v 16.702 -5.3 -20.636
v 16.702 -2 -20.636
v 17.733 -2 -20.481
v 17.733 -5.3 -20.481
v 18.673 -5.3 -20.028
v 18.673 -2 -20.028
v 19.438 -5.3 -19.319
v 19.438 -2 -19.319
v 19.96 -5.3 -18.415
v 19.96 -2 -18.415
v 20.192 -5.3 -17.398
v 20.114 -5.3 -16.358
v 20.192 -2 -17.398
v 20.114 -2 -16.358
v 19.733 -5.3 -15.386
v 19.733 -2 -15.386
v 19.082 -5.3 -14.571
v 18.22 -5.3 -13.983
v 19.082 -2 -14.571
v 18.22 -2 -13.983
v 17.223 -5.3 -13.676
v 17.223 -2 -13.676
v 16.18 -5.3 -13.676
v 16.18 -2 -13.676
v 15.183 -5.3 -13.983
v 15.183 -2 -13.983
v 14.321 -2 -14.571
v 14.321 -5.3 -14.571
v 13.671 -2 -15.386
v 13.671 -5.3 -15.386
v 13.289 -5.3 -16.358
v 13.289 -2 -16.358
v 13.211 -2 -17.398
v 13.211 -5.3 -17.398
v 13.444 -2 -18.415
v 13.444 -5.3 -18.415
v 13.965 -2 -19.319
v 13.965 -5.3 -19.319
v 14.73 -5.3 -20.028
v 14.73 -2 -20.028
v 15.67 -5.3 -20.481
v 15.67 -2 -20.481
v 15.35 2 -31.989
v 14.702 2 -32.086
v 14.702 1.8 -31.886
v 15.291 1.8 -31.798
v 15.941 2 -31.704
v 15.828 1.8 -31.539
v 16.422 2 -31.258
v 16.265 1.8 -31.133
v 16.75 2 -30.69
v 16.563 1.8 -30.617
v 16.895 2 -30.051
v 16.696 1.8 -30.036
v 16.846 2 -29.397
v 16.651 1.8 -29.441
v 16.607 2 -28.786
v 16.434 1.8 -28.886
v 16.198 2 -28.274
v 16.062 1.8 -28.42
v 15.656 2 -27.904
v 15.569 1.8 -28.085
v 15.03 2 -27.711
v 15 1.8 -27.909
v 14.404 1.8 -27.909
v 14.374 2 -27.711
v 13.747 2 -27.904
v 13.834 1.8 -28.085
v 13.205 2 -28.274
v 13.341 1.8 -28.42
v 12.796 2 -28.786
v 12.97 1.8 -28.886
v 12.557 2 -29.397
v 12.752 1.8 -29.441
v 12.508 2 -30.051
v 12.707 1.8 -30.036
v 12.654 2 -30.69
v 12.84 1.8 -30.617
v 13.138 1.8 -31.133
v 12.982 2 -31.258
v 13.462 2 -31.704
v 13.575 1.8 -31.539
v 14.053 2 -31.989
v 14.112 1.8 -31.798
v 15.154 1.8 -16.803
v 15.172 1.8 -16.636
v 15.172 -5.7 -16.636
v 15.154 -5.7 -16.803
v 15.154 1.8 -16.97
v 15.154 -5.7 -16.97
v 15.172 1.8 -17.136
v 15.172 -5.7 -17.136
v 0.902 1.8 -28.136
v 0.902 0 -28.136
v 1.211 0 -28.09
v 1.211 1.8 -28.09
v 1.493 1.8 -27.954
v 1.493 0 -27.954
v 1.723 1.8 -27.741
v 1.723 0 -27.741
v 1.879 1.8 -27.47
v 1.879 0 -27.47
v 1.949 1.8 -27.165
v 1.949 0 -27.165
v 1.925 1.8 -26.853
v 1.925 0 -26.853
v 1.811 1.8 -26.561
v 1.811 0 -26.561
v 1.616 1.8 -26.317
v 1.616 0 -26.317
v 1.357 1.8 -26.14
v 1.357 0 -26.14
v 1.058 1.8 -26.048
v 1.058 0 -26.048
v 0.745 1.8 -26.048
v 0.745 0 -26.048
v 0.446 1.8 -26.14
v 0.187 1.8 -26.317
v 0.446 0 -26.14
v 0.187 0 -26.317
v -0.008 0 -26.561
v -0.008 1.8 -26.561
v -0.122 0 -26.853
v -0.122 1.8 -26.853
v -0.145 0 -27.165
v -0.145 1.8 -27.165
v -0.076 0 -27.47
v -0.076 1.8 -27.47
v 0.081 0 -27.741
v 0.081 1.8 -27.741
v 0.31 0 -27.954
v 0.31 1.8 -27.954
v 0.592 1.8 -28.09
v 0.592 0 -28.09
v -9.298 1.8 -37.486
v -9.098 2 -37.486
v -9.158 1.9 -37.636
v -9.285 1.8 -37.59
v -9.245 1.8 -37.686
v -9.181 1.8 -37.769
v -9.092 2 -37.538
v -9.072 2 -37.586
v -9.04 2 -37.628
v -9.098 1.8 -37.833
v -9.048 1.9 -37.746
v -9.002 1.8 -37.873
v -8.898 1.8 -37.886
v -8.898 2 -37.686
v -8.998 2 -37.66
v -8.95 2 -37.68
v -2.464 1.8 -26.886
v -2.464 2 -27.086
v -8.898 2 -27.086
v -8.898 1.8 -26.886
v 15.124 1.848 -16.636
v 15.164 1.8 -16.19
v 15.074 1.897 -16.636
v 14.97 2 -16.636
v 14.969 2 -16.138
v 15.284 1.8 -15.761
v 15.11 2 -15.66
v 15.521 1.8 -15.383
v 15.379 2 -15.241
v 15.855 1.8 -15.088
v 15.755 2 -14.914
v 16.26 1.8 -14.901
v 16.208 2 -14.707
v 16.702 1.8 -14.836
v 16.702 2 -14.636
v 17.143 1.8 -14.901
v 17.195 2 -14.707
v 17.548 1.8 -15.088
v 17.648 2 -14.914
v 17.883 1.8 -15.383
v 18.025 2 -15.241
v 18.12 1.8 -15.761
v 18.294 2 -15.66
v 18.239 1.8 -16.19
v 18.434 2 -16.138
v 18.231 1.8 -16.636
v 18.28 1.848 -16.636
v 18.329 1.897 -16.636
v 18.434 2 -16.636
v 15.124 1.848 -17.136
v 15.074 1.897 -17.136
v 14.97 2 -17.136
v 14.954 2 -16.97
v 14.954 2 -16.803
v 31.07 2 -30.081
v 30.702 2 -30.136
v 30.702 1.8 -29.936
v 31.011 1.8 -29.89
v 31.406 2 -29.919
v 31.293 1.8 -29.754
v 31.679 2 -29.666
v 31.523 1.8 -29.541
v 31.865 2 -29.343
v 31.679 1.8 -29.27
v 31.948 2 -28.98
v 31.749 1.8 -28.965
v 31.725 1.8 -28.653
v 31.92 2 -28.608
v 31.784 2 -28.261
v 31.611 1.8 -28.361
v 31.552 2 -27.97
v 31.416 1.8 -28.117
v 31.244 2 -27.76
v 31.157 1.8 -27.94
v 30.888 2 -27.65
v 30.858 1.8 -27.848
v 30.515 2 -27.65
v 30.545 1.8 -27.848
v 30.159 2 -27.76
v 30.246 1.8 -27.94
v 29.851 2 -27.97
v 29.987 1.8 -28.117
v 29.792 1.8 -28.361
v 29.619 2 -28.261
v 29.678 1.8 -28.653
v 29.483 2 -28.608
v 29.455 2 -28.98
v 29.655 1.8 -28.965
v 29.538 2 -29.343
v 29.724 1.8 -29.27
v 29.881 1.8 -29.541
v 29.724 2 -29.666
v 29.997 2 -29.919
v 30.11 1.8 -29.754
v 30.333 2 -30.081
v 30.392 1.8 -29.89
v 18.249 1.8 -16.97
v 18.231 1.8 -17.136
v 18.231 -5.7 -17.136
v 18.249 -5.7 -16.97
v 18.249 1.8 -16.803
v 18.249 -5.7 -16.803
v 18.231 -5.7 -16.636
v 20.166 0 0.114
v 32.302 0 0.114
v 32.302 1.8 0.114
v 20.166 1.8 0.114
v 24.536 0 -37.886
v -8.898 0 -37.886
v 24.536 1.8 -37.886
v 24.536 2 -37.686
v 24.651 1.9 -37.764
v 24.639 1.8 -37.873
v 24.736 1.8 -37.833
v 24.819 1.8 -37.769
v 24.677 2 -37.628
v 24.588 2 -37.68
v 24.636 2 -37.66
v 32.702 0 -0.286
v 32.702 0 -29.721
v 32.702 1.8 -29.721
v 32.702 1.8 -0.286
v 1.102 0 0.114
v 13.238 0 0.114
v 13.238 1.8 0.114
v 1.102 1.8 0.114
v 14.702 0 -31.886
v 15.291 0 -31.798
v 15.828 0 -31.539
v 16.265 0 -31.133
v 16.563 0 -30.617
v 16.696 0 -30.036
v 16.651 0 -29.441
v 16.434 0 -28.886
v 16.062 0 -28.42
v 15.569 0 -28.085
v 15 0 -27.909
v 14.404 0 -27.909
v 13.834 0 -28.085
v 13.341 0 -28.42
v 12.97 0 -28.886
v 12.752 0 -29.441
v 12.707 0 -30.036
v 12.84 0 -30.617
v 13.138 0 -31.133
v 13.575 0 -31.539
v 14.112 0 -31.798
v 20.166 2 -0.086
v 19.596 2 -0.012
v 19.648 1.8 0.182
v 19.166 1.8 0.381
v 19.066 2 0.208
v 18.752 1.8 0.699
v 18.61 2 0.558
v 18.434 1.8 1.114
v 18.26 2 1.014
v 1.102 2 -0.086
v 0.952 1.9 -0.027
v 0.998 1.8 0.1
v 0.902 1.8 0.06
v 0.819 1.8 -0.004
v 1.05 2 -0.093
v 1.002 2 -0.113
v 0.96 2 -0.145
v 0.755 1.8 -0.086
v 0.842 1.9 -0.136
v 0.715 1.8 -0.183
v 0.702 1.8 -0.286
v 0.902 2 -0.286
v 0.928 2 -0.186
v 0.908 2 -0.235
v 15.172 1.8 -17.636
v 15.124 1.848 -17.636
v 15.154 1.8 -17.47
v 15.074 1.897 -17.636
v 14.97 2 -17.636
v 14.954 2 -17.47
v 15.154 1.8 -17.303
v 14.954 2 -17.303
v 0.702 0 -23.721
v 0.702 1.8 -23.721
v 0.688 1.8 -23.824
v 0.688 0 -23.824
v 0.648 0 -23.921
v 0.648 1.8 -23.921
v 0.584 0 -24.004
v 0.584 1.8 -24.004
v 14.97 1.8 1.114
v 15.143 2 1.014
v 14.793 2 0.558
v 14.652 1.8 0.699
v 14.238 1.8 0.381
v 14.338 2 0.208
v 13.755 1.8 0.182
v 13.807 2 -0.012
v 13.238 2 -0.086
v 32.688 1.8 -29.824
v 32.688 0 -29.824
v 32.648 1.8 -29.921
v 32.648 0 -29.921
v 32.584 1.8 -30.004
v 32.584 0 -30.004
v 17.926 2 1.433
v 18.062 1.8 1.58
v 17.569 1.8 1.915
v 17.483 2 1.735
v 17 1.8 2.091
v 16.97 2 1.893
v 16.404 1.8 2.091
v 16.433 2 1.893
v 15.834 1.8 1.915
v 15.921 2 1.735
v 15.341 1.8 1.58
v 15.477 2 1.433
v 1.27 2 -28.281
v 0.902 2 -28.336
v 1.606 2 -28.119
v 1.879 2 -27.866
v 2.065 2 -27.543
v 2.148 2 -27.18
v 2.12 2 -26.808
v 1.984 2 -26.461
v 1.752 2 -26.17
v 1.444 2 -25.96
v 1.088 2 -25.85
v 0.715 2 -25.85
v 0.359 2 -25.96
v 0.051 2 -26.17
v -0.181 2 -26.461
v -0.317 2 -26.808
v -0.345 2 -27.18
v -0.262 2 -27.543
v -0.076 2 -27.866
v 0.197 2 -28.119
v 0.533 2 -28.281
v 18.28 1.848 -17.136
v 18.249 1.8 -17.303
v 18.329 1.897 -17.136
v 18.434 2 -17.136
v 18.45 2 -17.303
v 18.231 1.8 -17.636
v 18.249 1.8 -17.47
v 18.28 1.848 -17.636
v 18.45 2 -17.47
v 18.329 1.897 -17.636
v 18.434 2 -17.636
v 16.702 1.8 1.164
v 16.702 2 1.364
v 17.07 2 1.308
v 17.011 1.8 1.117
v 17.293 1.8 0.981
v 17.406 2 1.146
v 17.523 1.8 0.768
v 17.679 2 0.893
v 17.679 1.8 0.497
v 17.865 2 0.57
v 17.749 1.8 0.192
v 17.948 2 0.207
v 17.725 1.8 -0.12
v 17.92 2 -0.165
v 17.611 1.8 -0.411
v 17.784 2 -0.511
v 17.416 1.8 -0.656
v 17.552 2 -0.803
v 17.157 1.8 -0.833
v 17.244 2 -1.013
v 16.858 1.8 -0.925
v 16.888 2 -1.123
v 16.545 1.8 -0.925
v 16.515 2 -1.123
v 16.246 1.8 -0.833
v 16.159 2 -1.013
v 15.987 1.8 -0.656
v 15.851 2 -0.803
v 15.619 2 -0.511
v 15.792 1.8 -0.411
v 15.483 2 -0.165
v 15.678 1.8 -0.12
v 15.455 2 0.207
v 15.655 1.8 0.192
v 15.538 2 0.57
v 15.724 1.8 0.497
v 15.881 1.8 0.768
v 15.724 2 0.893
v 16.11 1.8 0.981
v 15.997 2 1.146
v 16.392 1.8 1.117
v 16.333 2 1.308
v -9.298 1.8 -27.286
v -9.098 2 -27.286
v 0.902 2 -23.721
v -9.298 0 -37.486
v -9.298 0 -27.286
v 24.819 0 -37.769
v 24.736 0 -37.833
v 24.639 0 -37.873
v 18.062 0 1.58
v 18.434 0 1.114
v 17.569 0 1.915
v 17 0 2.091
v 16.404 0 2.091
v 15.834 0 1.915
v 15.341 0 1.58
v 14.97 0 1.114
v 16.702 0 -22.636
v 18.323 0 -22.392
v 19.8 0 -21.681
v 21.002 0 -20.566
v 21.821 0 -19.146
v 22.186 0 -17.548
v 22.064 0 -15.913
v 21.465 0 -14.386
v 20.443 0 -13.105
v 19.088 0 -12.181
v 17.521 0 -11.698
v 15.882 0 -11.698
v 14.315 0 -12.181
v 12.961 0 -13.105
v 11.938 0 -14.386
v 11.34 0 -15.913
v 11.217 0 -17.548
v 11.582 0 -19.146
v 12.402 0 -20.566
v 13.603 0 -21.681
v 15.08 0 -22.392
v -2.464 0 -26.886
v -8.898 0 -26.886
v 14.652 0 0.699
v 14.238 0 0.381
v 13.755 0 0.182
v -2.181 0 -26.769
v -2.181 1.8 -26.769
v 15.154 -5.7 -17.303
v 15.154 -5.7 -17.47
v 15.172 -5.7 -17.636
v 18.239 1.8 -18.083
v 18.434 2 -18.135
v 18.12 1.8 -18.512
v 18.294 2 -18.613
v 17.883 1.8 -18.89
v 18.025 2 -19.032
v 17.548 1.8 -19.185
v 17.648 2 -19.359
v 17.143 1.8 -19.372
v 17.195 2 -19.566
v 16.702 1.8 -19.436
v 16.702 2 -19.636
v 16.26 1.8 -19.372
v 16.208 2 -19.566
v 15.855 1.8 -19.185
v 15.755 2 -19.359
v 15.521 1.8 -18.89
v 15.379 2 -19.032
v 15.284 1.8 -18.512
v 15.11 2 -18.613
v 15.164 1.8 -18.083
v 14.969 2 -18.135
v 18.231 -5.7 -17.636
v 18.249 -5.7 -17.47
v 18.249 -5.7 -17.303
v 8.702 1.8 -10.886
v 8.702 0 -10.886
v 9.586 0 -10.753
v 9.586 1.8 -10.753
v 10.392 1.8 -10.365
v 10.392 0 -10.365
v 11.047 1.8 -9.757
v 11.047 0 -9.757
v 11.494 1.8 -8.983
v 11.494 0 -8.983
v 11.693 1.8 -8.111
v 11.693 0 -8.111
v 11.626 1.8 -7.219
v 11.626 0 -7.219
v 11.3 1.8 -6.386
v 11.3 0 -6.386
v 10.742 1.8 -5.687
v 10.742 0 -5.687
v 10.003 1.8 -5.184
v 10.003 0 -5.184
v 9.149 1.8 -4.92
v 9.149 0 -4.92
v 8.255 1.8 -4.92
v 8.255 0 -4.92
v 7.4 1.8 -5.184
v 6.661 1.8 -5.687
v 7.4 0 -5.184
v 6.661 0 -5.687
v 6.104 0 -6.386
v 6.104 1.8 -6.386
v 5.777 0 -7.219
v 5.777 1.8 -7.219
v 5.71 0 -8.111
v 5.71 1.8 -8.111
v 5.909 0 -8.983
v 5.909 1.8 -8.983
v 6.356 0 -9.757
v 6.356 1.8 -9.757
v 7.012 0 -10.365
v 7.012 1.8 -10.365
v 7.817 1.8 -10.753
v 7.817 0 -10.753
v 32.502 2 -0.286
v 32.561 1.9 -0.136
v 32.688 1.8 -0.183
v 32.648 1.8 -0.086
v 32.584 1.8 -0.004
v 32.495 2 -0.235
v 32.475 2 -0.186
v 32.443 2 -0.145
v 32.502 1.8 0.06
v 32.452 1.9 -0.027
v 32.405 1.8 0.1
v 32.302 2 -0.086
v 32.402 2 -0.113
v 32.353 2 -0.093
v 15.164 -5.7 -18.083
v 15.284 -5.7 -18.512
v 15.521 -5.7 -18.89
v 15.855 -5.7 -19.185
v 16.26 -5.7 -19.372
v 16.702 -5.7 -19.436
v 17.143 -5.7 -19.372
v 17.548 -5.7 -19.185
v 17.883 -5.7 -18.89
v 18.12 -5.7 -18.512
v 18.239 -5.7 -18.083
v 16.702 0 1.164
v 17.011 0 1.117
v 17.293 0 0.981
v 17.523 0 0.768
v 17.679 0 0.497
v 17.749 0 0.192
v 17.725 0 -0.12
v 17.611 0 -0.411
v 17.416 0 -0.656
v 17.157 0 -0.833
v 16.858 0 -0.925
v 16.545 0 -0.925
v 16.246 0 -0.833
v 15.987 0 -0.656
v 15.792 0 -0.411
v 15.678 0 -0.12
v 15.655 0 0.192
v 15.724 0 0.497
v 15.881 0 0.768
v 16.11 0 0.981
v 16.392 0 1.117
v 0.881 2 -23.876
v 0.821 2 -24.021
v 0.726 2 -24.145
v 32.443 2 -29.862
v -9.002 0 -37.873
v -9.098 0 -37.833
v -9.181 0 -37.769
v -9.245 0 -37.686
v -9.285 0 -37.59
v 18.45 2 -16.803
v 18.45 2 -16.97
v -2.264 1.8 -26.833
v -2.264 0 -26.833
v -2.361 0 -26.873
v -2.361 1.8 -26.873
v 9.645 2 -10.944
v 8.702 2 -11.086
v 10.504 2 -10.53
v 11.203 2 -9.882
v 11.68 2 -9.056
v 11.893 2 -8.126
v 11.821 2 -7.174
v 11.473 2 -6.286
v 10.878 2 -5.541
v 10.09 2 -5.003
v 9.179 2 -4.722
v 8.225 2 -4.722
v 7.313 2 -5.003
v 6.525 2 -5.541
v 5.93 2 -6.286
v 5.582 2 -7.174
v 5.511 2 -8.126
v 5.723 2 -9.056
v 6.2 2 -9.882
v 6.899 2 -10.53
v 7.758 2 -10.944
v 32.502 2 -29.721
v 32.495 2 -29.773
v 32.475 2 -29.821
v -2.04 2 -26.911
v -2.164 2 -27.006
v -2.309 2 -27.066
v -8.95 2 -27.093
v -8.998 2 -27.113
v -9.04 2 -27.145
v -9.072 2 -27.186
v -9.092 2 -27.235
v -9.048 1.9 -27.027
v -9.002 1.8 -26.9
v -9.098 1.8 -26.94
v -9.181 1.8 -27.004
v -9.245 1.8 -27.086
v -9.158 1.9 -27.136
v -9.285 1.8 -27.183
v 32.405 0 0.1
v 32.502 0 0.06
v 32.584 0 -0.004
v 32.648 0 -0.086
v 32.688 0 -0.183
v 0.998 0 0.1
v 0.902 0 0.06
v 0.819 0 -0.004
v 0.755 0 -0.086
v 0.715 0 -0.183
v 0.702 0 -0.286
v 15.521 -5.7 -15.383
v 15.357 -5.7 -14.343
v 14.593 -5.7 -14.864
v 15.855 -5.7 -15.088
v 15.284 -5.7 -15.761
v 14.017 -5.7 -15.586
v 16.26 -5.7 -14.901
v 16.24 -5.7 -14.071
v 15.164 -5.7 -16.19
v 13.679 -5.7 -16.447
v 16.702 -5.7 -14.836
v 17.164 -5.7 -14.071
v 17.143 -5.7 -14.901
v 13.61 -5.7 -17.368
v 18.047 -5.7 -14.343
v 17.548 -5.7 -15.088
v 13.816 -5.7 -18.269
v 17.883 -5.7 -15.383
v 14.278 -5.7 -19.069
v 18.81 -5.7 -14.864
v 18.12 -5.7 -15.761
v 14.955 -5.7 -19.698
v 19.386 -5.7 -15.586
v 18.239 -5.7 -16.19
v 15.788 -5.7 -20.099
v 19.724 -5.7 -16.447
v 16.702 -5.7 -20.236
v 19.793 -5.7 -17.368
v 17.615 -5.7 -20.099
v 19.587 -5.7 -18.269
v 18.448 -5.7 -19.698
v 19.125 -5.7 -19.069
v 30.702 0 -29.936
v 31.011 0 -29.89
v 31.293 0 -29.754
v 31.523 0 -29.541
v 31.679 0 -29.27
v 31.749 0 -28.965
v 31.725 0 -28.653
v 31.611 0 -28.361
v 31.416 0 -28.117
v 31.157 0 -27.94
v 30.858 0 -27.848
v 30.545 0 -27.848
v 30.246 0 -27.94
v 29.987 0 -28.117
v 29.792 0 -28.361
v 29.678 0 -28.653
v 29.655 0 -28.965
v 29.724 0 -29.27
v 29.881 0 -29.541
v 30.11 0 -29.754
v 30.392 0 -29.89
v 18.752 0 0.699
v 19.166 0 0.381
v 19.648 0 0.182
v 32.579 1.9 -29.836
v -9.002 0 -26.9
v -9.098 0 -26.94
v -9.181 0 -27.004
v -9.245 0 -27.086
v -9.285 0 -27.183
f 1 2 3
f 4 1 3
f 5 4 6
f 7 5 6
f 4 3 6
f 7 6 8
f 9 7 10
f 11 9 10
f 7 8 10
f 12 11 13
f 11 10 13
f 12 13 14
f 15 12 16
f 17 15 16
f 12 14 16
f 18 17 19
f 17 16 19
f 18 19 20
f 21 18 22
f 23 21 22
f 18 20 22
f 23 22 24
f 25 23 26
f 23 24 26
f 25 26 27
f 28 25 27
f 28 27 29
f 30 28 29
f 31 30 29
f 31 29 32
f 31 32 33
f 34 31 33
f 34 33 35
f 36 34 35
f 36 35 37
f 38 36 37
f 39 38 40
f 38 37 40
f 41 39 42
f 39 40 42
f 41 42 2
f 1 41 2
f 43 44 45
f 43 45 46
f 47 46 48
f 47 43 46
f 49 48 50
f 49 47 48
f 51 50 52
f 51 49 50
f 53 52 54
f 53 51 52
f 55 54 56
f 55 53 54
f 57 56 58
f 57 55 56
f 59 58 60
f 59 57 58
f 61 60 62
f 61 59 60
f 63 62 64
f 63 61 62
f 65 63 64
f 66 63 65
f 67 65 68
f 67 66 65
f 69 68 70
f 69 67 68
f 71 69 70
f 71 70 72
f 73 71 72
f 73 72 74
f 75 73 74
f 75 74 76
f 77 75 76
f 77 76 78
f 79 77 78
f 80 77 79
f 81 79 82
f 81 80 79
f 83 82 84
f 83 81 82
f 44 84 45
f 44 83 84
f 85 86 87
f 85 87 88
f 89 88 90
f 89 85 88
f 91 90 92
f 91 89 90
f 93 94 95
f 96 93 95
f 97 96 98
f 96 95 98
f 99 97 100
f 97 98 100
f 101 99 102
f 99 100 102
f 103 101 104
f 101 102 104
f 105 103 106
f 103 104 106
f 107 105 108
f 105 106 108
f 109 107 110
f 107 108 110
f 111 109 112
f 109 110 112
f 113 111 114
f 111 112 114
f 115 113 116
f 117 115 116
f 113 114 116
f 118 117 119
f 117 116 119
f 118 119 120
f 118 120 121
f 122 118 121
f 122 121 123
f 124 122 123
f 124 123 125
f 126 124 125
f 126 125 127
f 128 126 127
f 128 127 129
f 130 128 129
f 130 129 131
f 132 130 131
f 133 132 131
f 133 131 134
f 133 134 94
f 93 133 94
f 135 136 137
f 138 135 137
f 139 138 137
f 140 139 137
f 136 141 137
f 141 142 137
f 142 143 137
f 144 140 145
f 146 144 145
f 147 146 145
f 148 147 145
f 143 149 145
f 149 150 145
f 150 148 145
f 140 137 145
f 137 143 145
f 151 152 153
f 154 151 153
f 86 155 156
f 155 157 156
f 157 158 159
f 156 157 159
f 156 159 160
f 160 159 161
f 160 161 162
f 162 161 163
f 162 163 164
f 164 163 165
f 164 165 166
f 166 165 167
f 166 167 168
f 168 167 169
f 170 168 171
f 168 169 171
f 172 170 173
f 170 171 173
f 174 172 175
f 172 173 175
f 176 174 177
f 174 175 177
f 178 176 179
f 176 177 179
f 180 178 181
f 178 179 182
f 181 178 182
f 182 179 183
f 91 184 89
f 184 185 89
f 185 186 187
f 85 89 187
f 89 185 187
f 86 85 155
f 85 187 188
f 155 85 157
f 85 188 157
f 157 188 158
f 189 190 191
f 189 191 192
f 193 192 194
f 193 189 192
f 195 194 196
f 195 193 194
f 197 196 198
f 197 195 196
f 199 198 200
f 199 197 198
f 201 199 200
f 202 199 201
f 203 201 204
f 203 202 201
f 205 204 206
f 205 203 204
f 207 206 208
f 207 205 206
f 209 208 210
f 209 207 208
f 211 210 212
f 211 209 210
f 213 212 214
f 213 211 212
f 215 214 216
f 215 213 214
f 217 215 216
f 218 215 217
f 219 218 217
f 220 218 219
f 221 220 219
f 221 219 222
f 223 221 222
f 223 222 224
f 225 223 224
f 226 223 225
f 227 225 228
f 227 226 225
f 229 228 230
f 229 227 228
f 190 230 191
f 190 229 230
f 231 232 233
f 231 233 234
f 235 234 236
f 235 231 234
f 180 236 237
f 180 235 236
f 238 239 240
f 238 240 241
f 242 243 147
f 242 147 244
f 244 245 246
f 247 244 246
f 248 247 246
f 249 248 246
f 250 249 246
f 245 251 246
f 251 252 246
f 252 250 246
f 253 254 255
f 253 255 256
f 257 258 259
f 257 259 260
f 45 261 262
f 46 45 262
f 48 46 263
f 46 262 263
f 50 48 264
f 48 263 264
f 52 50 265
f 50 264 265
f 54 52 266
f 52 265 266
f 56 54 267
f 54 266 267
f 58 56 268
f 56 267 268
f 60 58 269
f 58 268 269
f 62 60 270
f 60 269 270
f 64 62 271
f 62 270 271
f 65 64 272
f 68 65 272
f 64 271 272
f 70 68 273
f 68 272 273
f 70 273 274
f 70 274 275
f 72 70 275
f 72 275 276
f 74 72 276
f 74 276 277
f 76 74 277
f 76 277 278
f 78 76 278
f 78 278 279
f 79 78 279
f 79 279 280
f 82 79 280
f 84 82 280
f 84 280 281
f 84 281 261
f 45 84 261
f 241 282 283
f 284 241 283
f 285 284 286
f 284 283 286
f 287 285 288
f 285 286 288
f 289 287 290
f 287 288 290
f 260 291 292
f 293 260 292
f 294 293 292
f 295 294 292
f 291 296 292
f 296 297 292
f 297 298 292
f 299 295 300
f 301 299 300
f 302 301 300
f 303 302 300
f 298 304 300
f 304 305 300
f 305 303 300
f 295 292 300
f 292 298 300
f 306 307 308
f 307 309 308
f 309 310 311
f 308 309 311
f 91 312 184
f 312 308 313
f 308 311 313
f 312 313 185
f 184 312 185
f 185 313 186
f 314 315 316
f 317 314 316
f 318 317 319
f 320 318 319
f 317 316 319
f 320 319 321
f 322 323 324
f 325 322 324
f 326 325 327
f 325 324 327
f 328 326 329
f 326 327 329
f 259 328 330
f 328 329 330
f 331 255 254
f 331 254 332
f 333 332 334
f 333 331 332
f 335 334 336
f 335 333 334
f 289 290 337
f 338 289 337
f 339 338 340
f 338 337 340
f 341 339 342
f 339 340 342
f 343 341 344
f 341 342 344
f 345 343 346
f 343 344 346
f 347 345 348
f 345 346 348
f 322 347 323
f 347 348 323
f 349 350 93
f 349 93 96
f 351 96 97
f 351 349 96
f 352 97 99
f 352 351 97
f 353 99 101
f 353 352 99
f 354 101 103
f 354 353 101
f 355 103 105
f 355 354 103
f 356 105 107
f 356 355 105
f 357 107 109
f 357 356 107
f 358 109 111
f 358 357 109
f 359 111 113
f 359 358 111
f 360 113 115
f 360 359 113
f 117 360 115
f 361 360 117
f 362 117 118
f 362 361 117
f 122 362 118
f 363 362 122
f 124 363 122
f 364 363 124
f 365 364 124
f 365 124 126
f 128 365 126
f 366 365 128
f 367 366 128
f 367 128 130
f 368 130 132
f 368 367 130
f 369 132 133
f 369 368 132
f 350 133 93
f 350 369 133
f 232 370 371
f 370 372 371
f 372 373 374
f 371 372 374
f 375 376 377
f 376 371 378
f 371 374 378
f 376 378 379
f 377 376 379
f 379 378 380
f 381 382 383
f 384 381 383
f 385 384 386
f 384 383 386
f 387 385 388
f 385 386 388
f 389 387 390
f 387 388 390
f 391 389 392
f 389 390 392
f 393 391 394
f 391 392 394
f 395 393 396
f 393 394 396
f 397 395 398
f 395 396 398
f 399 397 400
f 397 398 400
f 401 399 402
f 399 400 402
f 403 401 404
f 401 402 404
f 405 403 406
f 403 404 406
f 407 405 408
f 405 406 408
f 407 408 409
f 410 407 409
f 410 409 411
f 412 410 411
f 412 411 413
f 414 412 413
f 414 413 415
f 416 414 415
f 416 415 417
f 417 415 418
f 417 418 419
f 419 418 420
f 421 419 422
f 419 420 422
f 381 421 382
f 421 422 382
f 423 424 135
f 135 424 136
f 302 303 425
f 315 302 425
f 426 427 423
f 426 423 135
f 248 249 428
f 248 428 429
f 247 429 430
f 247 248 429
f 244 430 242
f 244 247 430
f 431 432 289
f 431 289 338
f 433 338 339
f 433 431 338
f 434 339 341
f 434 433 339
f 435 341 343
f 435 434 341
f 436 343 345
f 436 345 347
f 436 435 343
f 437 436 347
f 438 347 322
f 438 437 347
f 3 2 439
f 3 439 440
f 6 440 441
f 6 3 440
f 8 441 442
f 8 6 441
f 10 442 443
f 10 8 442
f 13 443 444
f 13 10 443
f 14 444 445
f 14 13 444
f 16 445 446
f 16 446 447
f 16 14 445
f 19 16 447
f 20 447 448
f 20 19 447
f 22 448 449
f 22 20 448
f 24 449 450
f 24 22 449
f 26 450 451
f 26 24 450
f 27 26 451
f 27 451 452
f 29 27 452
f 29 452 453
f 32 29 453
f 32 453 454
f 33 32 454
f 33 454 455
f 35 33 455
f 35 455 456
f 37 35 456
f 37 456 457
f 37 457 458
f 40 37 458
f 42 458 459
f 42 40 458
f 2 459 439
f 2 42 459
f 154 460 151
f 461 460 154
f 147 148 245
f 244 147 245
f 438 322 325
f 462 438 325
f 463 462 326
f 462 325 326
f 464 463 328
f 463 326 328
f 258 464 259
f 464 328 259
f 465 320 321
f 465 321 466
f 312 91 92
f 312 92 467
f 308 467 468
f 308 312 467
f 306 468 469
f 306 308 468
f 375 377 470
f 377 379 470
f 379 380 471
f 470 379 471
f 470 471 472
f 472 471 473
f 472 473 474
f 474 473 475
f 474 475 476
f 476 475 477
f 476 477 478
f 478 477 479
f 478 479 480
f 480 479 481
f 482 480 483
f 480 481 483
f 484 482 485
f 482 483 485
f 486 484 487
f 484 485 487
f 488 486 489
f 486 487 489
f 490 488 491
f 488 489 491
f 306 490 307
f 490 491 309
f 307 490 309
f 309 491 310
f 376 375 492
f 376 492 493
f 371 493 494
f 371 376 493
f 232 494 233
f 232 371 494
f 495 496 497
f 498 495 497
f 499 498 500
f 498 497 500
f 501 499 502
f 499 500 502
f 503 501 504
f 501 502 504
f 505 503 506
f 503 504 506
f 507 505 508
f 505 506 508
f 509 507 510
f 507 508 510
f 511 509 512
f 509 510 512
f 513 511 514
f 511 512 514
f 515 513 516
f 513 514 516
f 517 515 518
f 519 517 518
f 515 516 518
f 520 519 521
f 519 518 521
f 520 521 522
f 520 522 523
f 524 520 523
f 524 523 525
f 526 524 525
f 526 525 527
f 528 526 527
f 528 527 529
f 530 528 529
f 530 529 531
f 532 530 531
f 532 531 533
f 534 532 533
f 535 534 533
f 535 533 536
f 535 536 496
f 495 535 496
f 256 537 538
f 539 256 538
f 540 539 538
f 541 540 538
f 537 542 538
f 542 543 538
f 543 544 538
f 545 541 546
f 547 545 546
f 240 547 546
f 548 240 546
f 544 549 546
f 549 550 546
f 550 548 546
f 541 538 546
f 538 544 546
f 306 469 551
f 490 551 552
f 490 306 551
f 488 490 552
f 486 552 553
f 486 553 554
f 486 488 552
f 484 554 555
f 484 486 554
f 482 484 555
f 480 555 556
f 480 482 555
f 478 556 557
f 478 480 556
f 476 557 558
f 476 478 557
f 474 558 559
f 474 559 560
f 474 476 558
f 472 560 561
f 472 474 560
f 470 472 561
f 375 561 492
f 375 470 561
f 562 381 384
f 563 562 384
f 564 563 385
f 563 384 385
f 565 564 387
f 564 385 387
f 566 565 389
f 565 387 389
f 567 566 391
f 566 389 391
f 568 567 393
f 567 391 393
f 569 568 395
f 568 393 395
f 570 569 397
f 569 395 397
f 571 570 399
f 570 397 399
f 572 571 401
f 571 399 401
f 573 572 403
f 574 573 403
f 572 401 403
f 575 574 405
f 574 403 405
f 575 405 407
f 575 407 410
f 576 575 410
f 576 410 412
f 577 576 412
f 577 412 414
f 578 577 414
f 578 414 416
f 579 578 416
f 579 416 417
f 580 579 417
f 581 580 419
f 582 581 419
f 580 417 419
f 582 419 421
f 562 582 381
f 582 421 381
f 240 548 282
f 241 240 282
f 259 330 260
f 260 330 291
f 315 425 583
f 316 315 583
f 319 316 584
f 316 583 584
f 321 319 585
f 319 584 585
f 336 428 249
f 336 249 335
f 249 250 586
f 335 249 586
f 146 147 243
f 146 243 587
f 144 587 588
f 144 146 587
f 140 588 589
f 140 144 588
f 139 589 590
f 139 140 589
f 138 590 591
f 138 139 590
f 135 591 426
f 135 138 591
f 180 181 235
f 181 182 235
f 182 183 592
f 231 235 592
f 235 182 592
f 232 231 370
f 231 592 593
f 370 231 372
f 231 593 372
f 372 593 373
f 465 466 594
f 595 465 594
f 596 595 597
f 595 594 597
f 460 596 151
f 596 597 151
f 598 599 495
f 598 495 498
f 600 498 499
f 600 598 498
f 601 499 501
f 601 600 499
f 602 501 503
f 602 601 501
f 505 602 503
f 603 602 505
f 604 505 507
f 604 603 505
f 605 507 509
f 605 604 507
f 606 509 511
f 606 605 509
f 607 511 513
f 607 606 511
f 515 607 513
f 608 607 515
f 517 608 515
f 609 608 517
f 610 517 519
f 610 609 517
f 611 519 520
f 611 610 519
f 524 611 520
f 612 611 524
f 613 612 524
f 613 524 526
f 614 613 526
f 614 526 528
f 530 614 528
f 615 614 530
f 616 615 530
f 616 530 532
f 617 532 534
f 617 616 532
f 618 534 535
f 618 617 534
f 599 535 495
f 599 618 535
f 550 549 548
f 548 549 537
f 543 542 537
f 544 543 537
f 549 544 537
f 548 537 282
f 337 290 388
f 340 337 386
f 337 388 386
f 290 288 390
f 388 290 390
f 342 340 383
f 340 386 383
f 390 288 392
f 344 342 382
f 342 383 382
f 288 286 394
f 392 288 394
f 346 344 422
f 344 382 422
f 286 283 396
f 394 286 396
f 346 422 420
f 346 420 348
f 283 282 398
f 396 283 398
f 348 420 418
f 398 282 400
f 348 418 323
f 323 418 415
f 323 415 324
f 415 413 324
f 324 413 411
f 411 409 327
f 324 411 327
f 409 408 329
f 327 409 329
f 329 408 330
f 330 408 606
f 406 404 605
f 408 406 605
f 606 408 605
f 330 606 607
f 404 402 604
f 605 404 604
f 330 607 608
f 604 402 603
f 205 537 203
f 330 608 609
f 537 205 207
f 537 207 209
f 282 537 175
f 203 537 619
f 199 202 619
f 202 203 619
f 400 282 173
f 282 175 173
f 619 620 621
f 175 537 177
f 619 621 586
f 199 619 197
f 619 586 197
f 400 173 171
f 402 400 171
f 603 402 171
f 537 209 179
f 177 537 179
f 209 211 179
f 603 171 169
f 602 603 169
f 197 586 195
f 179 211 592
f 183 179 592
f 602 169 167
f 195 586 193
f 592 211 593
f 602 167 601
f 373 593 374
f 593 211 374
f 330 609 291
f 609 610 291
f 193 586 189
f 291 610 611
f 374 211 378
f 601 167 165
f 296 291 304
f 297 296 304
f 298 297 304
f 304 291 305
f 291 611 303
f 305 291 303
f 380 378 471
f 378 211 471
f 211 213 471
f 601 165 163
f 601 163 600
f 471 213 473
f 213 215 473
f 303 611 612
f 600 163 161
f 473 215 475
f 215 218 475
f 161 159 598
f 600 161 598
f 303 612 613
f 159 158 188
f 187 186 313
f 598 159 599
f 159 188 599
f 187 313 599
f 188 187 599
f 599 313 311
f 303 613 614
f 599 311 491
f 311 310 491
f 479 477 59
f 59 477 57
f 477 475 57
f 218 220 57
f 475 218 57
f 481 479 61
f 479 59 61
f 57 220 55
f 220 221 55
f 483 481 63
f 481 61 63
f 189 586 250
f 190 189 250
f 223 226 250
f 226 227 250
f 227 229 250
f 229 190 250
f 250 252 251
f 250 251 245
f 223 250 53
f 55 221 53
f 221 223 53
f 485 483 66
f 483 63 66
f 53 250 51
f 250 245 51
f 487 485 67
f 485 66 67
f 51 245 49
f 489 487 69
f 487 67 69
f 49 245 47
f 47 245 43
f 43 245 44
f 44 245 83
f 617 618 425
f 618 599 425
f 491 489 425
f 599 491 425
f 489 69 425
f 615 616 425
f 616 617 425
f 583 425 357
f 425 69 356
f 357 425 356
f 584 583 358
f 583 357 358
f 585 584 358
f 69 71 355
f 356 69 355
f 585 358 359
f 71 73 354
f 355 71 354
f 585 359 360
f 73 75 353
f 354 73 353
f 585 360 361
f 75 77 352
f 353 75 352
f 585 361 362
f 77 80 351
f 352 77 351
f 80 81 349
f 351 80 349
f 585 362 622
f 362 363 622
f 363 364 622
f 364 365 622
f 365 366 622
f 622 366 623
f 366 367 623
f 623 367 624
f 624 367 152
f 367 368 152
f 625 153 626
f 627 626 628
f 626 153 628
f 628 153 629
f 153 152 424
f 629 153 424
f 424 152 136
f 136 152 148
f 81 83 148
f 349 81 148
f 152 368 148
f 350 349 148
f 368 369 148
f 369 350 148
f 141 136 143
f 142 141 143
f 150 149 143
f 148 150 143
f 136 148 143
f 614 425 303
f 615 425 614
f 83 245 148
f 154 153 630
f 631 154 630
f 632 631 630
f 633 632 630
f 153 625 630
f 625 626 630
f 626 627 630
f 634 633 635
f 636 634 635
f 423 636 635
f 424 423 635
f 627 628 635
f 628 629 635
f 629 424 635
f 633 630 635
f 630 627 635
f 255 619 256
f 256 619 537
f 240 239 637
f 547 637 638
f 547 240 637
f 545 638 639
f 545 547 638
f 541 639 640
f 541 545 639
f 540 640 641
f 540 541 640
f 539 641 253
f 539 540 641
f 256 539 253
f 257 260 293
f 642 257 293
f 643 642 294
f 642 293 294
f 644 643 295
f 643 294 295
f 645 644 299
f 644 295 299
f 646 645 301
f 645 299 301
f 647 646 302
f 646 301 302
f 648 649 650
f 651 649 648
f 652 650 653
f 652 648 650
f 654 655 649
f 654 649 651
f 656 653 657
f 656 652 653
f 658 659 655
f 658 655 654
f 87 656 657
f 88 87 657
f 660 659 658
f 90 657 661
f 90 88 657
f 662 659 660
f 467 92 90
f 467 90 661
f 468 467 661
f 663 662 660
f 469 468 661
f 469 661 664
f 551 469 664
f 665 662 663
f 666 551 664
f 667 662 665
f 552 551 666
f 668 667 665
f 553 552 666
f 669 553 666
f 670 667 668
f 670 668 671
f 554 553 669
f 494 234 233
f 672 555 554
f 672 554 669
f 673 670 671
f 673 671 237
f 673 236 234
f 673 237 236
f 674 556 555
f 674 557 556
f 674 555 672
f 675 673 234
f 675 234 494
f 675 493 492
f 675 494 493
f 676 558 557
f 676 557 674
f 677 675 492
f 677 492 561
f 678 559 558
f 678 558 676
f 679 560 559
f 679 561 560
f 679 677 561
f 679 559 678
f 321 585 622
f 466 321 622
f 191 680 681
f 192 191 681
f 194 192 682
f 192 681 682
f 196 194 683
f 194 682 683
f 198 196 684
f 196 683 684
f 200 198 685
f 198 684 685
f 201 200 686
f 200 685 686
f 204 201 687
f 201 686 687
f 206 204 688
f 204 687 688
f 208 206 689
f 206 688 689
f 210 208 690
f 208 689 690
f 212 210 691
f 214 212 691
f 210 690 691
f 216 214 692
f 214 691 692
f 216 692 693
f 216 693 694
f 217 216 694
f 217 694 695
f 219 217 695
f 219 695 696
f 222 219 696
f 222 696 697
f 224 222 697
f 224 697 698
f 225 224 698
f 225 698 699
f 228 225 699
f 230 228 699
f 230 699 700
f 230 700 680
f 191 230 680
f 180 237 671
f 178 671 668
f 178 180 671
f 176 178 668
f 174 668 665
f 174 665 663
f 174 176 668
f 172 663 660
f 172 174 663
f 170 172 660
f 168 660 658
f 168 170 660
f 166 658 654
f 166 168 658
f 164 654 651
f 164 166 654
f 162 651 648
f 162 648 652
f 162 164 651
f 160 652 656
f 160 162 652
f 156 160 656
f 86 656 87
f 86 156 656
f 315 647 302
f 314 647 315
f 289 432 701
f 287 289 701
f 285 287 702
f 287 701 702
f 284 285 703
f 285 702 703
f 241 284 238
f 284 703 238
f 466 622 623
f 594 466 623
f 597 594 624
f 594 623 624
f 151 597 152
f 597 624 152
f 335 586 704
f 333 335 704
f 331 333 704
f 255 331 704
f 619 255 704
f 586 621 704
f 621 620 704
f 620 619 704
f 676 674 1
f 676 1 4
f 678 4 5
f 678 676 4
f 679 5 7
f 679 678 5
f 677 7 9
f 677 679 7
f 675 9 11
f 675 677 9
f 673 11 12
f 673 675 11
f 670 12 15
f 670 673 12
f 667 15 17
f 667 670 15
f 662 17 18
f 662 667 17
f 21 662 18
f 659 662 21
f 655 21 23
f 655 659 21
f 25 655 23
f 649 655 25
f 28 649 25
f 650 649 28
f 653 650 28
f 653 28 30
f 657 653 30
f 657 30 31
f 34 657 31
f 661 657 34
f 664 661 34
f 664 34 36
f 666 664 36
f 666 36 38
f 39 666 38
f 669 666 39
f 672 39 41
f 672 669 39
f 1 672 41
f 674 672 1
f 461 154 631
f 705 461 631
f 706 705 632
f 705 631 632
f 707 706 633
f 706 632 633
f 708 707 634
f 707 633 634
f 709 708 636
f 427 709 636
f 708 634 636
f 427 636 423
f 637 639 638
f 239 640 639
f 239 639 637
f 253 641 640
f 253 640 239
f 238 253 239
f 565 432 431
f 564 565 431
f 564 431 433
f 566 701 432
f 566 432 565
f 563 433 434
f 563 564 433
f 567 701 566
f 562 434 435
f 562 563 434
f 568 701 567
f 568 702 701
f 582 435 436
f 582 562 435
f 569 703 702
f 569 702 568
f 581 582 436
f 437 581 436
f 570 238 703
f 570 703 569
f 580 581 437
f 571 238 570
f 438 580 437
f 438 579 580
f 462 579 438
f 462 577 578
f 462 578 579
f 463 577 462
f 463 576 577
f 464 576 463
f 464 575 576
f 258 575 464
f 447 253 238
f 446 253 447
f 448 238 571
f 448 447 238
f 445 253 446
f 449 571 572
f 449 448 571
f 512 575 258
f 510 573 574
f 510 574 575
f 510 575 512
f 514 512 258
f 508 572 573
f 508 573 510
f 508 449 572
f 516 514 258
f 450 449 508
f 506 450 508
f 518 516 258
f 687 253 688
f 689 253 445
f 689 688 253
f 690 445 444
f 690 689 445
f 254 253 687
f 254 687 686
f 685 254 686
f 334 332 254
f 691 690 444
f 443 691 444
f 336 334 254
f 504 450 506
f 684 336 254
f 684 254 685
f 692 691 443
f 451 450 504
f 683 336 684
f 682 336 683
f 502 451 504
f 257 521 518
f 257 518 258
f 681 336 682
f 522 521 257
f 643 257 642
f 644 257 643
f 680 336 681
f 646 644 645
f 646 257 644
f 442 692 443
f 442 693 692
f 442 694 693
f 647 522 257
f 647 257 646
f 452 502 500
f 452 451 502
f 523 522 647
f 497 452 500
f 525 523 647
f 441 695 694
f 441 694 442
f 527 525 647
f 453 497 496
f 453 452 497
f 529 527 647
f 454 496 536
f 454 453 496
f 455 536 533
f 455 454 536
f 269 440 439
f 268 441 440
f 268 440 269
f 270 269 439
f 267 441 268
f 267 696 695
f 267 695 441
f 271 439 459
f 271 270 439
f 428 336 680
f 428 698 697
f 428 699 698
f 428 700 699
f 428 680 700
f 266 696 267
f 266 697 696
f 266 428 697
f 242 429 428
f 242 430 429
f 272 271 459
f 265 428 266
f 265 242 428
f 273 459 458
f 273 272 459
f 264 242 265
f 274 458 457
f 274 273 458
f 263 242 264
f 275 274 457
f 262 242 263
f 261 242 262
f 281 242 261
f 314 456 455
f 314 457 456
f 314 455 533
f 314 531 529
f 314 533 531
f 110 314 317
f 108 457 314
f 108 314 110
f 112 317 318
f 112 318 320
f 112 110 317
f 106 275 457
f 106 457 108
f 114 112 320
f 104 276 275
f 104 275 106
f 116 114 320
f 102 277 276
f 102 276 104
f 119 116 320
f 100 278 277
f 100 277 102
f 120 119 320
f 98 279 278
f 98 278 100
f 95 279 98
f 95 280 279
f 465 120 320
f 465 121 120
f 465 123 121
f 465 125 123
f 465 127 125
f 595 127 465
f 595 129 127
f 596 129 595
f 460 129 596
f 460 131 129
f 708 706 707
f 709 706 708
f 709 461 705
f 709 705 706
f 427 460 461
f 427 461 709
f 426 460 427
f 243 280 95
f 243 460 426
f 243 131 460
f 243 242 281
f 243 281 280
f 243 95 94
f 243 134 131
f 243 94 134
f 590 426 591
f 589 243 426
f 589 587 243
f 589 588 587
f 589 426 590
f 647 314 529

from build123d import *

# Parameters (mm, degrees)
EXTRUDE_1_DEPTH     = 2
SKETCH_2_R          = 3.5
EXTRUDE_2_DEPTH     = 5.7
CUT_EXTRUDE_START   = -4.7
CUT_EXTRUDE_1_DEPTH = 4.7
SKETCH_5_R          = 1.05
CUT_EXTRUDE_2_DEPTH = 10
SKETCH_6_R          = 2
EXTRUDE_3_DEPTH     = 2
FILLET_1_R          = 2
SKETCH_7_R          = 1.05
CUT_EXTRUDE_3_DEPTH = 2
FILLET_2_R          = 0.4
CHAMFER_1_SIZE      = 2
CHAMFER_2_SIZE      = 0.4
SKETCH_8_R          = 3
SKETCH_8_R_2        = 2
CUT_EXTRUDE_5_DEPTH = 51.37135361
CHAMFER_3_SIZE      = 0.2


with BuildPart() as part:
    # 草图1 → 凸台-拉伸1 (new body)
    with BuildSketch(Plane(origin=(0, 0, 0), x_dir=(1, 0, 0), z_dir=(0, 1, 0))):
        Polygon((0.701628422, -0.113501573), (0.701628422, 23.886498427), (-2.298371578, 26.886498427), (-9.298371578, 26.886498427), (-9.298371578, 37.886498427), (24.701628422, 37.886498427), (32.701628422, 29.886498427), (32.701628422, -0.113501573), align=None)
    extrude(amount=EXTRUDE_1_DEPTH)

    # 草图2 → 凸台-拉伸2 (add)
    with BuildSketch(Plane.XZ):
        with Locations(Location((16.701628422, -17.136498427, 0), (0, 0, 270))):
            Circle(SKETCH_2_R)
        with BuildLine():
            ThreePointArc((15.171922568, -17.636498427), (16.701628422, -19.436498427), (18.231334277, -17.636498427))
            ThreePointArc((18.231334277, -17.636498427), (18.251628422, -17.386498427), (18.231334277, -17.136498427))
            ThreePointArc((18.231334277, -17.136498427), (18.251628422, -16.886498427), (18.231334277, -16.636498427))
            ThreePointArc((18.231334277, -16.636498427), (16.701628422, -14.836498427), (15.171922568, -16.636498427))
            ThreePointArc((15.171922568, -16.636498427), (15.151628422, -16.886498427), (15.171922568, -17.136498427))
            ThreePointArc((15.171922568, -17.136498427), (15.151628422, -17.386498427), (15.171922568, -17.636498427))
        make_face(mode=Mode.SUBTRACT)
    extrude(amount=EXTRUDE_2_DEPTH)

    # 草图3 → 切除-拉伸1 (cut)
    with BuildSketch(Plane.XZ.offset(CUT_EXTRUDE_START)):
        with BuildLine():
            ThreePointArc((15.171922568, -17.136498427), (15.151628422, -17.386498427), (15.171922568, -17.636498427))
            ThreePointArc((15.171922568, -17.636498427), (16.701628422, -19.436498427), (18.231334277, -17.636498427))
            ThreePointArc((18.231334277, -17.636498427), (18.251628422, -17.386498427), (18.231334277, -17.136498427))
            ThreePointArc((18.231334277, -17.136498427), (18.251628422, -16.886498427), (18.231334277, -16.636498427))
            ThreePointArc((18.231334277, -16.636498427), (16.701628422, -14.836498427), (15.171922568, -16.636498427))
            ThreePointArc((15.171922568, -16.636498427), (15.151628422, -16.886498427), (15.171922568, -17.136498427))
        make_face()
    extrude(amount=CUT_EXTRUDE_1_DEPTH, mode=Mode.SUBTRACT)

    # 草图5 → 切除-拉伸2 (cut)
    with BuildSketch(Plane.XZ):
        with Locations(Location((30.701628422, -28.886498427, 0), (0, 0, 270))):
            Circle(SKETCH_5_R)
        with Locations(Location((0.901628422, -27.086498427, 0), (0, 0, 270))):
            Circle(SKETCH_5_R)
    extrude(amount=-CUT_EXTRUDE_2_DEPTH, mode=Mode.SUBTRACT)

    # 草图6 → 凸台-拉伸3 (add)
    with BuildSketch(Plane(origin=(0, 0, 0), x_dir=(-1, 0, 0), z_dir=(0, -1, 0))):
        with Locations((-16.701628422, -0.113501573)):
            Circle(SKETCH_6_R)
    extrude(amount=-EXTRUDE_3_DEPTH)

    # 圆角1
    fillet_1_edges = [part.edges().sort_by_distance(p)[0] for p in [
        (18.701628422, 1, 0.113501573),
        (14.701628422, 1, 0.113501573),
    ]]
    fillet(fillet_1_edges, radius=FILLET_1_R)

    # 草图7 → 切除-拉伸3 (cut)
    with BuildSketch(Plane(origin=(0, 2, 0), x_dir=(1, 0, 0), z_dir=(0, 1, 0))):
        with Locations(Location((16.701628422, -0.113501573, 0), (0, 0, 270))):
            Circle(SKETCH_7_R)
    extrude(amount=-CUT_EXTRUDE_3_DEPTH, mode=Mode.SUBTRACT)

    # 圆角2
    fillet_2_edges = [part.edges().sort_by_distance(p)[0] for p in [
        (0.701628422, 1, 0.113501573),
        (0.701628422, 1, -23.886498427),
        (-2.298371578, 1, -26.886498427),
        (-9.298371578, 1, -26.886498427),
        (-9.298371578, 1, -37.886498427),
        (24.701628422, 1, -37.886498427),
        (32.701628422, 1, -29.886498427),
        (32.701628422, 1, 0.113501573),
    ]]
    fillet(fillet_2_edges, radius=FILLET_2_R)

    # 倒角1
    chamfer_1_edges = [part.edges().sort_by_distance(p)[0] for p in [
        (16.701628422, 0, -13.636498427),
    ]]
    chamfer(chamfer_1_edges, length=CHAMFER_1_SIZE)

    # 倒角2
    chamfer_2_edges = [part.edges().sort_by_distance(p)[0] for p in [
        (16.701628422, -5.7, -13.636498427),
    ]]
    chamfer(chamfer_2_edges, length=CHAMFER_2_SIZE)

    # 草图8 → 切除-拉伸5 (cut, through all)
    with BuildSketch(Plane.XZ):
        with Locations(Location((8.701628422, -7.886498427, 0), (0, 0, 270))):
            Circle(SKETCH_8_R)
        with Locations(Location((14.701628422, -29.886498427, 0), (0, 0, 270))):
            Circle(SKETCH_8_R_2)
    extrude(amount=-CUT_EXTRUDE_5_DEPTH, mode=Mode.SUBTRACT)

    # 倒角3
    chamfer_3_edges = [part.edges().sort_by_distance(p)[0] for p in [
        (26.23367923, 2, 0.113501573),
        (16.701628422, 2, 2.113501573),
        (19.165730038, 2, 0.381450765),
        (14.237526807, 2, 0.381450765),
        (16.701628422, 2, -0.936498427),
        (7.81878571, 2, -37.886498427),
        (28.701628422, 2, -33.886498427),
        (7.169577615, 2, 0.113501573),
        (32.701628422, 2, -15.003655715),
        (-9.298371578, 2, -32.386498427),
        (-5.68121429, 2, -26.886498427),
        (-0.798371578, 2, -25.386498427),
        (0.701628422, 2, -12.003655715),
        (-9.18121429, 2, -27.003655715),
        (-9.18121429, 2, -37.769341139),
        (0.81878571, 2, -0.003655715),
        (32.584471135, 2, -0.003655715),
        (32.671180235, 2, -29.873886375),
        (24.68901637, 2, -37.85605024),
        (0.671180235, 2, -23.873886375),
        (-2.31098363, 2, -26.85605024),
        (8.701628422, 2, -4.886498427),
        (14.701628422, 2, -27.886498427),
        (16.701628422, 2, -19.436498427),
        (18.251628422, 2, -17.386498427),
        (18.251628422, 2, -16.886498427),
        (16.701628422, 2, -14.836498427),
        (15.151628422, 2, -16.886498427),
        (15.151628422, 2, -17.386498427),
        (30.701628422, 2, -27.836498427),
        (0.901628422, 2, -26.036498427),
    ]]
    chamfer(chamfer_3_edges, length=CHAMFER_3_SIZE)


solid = part.part
